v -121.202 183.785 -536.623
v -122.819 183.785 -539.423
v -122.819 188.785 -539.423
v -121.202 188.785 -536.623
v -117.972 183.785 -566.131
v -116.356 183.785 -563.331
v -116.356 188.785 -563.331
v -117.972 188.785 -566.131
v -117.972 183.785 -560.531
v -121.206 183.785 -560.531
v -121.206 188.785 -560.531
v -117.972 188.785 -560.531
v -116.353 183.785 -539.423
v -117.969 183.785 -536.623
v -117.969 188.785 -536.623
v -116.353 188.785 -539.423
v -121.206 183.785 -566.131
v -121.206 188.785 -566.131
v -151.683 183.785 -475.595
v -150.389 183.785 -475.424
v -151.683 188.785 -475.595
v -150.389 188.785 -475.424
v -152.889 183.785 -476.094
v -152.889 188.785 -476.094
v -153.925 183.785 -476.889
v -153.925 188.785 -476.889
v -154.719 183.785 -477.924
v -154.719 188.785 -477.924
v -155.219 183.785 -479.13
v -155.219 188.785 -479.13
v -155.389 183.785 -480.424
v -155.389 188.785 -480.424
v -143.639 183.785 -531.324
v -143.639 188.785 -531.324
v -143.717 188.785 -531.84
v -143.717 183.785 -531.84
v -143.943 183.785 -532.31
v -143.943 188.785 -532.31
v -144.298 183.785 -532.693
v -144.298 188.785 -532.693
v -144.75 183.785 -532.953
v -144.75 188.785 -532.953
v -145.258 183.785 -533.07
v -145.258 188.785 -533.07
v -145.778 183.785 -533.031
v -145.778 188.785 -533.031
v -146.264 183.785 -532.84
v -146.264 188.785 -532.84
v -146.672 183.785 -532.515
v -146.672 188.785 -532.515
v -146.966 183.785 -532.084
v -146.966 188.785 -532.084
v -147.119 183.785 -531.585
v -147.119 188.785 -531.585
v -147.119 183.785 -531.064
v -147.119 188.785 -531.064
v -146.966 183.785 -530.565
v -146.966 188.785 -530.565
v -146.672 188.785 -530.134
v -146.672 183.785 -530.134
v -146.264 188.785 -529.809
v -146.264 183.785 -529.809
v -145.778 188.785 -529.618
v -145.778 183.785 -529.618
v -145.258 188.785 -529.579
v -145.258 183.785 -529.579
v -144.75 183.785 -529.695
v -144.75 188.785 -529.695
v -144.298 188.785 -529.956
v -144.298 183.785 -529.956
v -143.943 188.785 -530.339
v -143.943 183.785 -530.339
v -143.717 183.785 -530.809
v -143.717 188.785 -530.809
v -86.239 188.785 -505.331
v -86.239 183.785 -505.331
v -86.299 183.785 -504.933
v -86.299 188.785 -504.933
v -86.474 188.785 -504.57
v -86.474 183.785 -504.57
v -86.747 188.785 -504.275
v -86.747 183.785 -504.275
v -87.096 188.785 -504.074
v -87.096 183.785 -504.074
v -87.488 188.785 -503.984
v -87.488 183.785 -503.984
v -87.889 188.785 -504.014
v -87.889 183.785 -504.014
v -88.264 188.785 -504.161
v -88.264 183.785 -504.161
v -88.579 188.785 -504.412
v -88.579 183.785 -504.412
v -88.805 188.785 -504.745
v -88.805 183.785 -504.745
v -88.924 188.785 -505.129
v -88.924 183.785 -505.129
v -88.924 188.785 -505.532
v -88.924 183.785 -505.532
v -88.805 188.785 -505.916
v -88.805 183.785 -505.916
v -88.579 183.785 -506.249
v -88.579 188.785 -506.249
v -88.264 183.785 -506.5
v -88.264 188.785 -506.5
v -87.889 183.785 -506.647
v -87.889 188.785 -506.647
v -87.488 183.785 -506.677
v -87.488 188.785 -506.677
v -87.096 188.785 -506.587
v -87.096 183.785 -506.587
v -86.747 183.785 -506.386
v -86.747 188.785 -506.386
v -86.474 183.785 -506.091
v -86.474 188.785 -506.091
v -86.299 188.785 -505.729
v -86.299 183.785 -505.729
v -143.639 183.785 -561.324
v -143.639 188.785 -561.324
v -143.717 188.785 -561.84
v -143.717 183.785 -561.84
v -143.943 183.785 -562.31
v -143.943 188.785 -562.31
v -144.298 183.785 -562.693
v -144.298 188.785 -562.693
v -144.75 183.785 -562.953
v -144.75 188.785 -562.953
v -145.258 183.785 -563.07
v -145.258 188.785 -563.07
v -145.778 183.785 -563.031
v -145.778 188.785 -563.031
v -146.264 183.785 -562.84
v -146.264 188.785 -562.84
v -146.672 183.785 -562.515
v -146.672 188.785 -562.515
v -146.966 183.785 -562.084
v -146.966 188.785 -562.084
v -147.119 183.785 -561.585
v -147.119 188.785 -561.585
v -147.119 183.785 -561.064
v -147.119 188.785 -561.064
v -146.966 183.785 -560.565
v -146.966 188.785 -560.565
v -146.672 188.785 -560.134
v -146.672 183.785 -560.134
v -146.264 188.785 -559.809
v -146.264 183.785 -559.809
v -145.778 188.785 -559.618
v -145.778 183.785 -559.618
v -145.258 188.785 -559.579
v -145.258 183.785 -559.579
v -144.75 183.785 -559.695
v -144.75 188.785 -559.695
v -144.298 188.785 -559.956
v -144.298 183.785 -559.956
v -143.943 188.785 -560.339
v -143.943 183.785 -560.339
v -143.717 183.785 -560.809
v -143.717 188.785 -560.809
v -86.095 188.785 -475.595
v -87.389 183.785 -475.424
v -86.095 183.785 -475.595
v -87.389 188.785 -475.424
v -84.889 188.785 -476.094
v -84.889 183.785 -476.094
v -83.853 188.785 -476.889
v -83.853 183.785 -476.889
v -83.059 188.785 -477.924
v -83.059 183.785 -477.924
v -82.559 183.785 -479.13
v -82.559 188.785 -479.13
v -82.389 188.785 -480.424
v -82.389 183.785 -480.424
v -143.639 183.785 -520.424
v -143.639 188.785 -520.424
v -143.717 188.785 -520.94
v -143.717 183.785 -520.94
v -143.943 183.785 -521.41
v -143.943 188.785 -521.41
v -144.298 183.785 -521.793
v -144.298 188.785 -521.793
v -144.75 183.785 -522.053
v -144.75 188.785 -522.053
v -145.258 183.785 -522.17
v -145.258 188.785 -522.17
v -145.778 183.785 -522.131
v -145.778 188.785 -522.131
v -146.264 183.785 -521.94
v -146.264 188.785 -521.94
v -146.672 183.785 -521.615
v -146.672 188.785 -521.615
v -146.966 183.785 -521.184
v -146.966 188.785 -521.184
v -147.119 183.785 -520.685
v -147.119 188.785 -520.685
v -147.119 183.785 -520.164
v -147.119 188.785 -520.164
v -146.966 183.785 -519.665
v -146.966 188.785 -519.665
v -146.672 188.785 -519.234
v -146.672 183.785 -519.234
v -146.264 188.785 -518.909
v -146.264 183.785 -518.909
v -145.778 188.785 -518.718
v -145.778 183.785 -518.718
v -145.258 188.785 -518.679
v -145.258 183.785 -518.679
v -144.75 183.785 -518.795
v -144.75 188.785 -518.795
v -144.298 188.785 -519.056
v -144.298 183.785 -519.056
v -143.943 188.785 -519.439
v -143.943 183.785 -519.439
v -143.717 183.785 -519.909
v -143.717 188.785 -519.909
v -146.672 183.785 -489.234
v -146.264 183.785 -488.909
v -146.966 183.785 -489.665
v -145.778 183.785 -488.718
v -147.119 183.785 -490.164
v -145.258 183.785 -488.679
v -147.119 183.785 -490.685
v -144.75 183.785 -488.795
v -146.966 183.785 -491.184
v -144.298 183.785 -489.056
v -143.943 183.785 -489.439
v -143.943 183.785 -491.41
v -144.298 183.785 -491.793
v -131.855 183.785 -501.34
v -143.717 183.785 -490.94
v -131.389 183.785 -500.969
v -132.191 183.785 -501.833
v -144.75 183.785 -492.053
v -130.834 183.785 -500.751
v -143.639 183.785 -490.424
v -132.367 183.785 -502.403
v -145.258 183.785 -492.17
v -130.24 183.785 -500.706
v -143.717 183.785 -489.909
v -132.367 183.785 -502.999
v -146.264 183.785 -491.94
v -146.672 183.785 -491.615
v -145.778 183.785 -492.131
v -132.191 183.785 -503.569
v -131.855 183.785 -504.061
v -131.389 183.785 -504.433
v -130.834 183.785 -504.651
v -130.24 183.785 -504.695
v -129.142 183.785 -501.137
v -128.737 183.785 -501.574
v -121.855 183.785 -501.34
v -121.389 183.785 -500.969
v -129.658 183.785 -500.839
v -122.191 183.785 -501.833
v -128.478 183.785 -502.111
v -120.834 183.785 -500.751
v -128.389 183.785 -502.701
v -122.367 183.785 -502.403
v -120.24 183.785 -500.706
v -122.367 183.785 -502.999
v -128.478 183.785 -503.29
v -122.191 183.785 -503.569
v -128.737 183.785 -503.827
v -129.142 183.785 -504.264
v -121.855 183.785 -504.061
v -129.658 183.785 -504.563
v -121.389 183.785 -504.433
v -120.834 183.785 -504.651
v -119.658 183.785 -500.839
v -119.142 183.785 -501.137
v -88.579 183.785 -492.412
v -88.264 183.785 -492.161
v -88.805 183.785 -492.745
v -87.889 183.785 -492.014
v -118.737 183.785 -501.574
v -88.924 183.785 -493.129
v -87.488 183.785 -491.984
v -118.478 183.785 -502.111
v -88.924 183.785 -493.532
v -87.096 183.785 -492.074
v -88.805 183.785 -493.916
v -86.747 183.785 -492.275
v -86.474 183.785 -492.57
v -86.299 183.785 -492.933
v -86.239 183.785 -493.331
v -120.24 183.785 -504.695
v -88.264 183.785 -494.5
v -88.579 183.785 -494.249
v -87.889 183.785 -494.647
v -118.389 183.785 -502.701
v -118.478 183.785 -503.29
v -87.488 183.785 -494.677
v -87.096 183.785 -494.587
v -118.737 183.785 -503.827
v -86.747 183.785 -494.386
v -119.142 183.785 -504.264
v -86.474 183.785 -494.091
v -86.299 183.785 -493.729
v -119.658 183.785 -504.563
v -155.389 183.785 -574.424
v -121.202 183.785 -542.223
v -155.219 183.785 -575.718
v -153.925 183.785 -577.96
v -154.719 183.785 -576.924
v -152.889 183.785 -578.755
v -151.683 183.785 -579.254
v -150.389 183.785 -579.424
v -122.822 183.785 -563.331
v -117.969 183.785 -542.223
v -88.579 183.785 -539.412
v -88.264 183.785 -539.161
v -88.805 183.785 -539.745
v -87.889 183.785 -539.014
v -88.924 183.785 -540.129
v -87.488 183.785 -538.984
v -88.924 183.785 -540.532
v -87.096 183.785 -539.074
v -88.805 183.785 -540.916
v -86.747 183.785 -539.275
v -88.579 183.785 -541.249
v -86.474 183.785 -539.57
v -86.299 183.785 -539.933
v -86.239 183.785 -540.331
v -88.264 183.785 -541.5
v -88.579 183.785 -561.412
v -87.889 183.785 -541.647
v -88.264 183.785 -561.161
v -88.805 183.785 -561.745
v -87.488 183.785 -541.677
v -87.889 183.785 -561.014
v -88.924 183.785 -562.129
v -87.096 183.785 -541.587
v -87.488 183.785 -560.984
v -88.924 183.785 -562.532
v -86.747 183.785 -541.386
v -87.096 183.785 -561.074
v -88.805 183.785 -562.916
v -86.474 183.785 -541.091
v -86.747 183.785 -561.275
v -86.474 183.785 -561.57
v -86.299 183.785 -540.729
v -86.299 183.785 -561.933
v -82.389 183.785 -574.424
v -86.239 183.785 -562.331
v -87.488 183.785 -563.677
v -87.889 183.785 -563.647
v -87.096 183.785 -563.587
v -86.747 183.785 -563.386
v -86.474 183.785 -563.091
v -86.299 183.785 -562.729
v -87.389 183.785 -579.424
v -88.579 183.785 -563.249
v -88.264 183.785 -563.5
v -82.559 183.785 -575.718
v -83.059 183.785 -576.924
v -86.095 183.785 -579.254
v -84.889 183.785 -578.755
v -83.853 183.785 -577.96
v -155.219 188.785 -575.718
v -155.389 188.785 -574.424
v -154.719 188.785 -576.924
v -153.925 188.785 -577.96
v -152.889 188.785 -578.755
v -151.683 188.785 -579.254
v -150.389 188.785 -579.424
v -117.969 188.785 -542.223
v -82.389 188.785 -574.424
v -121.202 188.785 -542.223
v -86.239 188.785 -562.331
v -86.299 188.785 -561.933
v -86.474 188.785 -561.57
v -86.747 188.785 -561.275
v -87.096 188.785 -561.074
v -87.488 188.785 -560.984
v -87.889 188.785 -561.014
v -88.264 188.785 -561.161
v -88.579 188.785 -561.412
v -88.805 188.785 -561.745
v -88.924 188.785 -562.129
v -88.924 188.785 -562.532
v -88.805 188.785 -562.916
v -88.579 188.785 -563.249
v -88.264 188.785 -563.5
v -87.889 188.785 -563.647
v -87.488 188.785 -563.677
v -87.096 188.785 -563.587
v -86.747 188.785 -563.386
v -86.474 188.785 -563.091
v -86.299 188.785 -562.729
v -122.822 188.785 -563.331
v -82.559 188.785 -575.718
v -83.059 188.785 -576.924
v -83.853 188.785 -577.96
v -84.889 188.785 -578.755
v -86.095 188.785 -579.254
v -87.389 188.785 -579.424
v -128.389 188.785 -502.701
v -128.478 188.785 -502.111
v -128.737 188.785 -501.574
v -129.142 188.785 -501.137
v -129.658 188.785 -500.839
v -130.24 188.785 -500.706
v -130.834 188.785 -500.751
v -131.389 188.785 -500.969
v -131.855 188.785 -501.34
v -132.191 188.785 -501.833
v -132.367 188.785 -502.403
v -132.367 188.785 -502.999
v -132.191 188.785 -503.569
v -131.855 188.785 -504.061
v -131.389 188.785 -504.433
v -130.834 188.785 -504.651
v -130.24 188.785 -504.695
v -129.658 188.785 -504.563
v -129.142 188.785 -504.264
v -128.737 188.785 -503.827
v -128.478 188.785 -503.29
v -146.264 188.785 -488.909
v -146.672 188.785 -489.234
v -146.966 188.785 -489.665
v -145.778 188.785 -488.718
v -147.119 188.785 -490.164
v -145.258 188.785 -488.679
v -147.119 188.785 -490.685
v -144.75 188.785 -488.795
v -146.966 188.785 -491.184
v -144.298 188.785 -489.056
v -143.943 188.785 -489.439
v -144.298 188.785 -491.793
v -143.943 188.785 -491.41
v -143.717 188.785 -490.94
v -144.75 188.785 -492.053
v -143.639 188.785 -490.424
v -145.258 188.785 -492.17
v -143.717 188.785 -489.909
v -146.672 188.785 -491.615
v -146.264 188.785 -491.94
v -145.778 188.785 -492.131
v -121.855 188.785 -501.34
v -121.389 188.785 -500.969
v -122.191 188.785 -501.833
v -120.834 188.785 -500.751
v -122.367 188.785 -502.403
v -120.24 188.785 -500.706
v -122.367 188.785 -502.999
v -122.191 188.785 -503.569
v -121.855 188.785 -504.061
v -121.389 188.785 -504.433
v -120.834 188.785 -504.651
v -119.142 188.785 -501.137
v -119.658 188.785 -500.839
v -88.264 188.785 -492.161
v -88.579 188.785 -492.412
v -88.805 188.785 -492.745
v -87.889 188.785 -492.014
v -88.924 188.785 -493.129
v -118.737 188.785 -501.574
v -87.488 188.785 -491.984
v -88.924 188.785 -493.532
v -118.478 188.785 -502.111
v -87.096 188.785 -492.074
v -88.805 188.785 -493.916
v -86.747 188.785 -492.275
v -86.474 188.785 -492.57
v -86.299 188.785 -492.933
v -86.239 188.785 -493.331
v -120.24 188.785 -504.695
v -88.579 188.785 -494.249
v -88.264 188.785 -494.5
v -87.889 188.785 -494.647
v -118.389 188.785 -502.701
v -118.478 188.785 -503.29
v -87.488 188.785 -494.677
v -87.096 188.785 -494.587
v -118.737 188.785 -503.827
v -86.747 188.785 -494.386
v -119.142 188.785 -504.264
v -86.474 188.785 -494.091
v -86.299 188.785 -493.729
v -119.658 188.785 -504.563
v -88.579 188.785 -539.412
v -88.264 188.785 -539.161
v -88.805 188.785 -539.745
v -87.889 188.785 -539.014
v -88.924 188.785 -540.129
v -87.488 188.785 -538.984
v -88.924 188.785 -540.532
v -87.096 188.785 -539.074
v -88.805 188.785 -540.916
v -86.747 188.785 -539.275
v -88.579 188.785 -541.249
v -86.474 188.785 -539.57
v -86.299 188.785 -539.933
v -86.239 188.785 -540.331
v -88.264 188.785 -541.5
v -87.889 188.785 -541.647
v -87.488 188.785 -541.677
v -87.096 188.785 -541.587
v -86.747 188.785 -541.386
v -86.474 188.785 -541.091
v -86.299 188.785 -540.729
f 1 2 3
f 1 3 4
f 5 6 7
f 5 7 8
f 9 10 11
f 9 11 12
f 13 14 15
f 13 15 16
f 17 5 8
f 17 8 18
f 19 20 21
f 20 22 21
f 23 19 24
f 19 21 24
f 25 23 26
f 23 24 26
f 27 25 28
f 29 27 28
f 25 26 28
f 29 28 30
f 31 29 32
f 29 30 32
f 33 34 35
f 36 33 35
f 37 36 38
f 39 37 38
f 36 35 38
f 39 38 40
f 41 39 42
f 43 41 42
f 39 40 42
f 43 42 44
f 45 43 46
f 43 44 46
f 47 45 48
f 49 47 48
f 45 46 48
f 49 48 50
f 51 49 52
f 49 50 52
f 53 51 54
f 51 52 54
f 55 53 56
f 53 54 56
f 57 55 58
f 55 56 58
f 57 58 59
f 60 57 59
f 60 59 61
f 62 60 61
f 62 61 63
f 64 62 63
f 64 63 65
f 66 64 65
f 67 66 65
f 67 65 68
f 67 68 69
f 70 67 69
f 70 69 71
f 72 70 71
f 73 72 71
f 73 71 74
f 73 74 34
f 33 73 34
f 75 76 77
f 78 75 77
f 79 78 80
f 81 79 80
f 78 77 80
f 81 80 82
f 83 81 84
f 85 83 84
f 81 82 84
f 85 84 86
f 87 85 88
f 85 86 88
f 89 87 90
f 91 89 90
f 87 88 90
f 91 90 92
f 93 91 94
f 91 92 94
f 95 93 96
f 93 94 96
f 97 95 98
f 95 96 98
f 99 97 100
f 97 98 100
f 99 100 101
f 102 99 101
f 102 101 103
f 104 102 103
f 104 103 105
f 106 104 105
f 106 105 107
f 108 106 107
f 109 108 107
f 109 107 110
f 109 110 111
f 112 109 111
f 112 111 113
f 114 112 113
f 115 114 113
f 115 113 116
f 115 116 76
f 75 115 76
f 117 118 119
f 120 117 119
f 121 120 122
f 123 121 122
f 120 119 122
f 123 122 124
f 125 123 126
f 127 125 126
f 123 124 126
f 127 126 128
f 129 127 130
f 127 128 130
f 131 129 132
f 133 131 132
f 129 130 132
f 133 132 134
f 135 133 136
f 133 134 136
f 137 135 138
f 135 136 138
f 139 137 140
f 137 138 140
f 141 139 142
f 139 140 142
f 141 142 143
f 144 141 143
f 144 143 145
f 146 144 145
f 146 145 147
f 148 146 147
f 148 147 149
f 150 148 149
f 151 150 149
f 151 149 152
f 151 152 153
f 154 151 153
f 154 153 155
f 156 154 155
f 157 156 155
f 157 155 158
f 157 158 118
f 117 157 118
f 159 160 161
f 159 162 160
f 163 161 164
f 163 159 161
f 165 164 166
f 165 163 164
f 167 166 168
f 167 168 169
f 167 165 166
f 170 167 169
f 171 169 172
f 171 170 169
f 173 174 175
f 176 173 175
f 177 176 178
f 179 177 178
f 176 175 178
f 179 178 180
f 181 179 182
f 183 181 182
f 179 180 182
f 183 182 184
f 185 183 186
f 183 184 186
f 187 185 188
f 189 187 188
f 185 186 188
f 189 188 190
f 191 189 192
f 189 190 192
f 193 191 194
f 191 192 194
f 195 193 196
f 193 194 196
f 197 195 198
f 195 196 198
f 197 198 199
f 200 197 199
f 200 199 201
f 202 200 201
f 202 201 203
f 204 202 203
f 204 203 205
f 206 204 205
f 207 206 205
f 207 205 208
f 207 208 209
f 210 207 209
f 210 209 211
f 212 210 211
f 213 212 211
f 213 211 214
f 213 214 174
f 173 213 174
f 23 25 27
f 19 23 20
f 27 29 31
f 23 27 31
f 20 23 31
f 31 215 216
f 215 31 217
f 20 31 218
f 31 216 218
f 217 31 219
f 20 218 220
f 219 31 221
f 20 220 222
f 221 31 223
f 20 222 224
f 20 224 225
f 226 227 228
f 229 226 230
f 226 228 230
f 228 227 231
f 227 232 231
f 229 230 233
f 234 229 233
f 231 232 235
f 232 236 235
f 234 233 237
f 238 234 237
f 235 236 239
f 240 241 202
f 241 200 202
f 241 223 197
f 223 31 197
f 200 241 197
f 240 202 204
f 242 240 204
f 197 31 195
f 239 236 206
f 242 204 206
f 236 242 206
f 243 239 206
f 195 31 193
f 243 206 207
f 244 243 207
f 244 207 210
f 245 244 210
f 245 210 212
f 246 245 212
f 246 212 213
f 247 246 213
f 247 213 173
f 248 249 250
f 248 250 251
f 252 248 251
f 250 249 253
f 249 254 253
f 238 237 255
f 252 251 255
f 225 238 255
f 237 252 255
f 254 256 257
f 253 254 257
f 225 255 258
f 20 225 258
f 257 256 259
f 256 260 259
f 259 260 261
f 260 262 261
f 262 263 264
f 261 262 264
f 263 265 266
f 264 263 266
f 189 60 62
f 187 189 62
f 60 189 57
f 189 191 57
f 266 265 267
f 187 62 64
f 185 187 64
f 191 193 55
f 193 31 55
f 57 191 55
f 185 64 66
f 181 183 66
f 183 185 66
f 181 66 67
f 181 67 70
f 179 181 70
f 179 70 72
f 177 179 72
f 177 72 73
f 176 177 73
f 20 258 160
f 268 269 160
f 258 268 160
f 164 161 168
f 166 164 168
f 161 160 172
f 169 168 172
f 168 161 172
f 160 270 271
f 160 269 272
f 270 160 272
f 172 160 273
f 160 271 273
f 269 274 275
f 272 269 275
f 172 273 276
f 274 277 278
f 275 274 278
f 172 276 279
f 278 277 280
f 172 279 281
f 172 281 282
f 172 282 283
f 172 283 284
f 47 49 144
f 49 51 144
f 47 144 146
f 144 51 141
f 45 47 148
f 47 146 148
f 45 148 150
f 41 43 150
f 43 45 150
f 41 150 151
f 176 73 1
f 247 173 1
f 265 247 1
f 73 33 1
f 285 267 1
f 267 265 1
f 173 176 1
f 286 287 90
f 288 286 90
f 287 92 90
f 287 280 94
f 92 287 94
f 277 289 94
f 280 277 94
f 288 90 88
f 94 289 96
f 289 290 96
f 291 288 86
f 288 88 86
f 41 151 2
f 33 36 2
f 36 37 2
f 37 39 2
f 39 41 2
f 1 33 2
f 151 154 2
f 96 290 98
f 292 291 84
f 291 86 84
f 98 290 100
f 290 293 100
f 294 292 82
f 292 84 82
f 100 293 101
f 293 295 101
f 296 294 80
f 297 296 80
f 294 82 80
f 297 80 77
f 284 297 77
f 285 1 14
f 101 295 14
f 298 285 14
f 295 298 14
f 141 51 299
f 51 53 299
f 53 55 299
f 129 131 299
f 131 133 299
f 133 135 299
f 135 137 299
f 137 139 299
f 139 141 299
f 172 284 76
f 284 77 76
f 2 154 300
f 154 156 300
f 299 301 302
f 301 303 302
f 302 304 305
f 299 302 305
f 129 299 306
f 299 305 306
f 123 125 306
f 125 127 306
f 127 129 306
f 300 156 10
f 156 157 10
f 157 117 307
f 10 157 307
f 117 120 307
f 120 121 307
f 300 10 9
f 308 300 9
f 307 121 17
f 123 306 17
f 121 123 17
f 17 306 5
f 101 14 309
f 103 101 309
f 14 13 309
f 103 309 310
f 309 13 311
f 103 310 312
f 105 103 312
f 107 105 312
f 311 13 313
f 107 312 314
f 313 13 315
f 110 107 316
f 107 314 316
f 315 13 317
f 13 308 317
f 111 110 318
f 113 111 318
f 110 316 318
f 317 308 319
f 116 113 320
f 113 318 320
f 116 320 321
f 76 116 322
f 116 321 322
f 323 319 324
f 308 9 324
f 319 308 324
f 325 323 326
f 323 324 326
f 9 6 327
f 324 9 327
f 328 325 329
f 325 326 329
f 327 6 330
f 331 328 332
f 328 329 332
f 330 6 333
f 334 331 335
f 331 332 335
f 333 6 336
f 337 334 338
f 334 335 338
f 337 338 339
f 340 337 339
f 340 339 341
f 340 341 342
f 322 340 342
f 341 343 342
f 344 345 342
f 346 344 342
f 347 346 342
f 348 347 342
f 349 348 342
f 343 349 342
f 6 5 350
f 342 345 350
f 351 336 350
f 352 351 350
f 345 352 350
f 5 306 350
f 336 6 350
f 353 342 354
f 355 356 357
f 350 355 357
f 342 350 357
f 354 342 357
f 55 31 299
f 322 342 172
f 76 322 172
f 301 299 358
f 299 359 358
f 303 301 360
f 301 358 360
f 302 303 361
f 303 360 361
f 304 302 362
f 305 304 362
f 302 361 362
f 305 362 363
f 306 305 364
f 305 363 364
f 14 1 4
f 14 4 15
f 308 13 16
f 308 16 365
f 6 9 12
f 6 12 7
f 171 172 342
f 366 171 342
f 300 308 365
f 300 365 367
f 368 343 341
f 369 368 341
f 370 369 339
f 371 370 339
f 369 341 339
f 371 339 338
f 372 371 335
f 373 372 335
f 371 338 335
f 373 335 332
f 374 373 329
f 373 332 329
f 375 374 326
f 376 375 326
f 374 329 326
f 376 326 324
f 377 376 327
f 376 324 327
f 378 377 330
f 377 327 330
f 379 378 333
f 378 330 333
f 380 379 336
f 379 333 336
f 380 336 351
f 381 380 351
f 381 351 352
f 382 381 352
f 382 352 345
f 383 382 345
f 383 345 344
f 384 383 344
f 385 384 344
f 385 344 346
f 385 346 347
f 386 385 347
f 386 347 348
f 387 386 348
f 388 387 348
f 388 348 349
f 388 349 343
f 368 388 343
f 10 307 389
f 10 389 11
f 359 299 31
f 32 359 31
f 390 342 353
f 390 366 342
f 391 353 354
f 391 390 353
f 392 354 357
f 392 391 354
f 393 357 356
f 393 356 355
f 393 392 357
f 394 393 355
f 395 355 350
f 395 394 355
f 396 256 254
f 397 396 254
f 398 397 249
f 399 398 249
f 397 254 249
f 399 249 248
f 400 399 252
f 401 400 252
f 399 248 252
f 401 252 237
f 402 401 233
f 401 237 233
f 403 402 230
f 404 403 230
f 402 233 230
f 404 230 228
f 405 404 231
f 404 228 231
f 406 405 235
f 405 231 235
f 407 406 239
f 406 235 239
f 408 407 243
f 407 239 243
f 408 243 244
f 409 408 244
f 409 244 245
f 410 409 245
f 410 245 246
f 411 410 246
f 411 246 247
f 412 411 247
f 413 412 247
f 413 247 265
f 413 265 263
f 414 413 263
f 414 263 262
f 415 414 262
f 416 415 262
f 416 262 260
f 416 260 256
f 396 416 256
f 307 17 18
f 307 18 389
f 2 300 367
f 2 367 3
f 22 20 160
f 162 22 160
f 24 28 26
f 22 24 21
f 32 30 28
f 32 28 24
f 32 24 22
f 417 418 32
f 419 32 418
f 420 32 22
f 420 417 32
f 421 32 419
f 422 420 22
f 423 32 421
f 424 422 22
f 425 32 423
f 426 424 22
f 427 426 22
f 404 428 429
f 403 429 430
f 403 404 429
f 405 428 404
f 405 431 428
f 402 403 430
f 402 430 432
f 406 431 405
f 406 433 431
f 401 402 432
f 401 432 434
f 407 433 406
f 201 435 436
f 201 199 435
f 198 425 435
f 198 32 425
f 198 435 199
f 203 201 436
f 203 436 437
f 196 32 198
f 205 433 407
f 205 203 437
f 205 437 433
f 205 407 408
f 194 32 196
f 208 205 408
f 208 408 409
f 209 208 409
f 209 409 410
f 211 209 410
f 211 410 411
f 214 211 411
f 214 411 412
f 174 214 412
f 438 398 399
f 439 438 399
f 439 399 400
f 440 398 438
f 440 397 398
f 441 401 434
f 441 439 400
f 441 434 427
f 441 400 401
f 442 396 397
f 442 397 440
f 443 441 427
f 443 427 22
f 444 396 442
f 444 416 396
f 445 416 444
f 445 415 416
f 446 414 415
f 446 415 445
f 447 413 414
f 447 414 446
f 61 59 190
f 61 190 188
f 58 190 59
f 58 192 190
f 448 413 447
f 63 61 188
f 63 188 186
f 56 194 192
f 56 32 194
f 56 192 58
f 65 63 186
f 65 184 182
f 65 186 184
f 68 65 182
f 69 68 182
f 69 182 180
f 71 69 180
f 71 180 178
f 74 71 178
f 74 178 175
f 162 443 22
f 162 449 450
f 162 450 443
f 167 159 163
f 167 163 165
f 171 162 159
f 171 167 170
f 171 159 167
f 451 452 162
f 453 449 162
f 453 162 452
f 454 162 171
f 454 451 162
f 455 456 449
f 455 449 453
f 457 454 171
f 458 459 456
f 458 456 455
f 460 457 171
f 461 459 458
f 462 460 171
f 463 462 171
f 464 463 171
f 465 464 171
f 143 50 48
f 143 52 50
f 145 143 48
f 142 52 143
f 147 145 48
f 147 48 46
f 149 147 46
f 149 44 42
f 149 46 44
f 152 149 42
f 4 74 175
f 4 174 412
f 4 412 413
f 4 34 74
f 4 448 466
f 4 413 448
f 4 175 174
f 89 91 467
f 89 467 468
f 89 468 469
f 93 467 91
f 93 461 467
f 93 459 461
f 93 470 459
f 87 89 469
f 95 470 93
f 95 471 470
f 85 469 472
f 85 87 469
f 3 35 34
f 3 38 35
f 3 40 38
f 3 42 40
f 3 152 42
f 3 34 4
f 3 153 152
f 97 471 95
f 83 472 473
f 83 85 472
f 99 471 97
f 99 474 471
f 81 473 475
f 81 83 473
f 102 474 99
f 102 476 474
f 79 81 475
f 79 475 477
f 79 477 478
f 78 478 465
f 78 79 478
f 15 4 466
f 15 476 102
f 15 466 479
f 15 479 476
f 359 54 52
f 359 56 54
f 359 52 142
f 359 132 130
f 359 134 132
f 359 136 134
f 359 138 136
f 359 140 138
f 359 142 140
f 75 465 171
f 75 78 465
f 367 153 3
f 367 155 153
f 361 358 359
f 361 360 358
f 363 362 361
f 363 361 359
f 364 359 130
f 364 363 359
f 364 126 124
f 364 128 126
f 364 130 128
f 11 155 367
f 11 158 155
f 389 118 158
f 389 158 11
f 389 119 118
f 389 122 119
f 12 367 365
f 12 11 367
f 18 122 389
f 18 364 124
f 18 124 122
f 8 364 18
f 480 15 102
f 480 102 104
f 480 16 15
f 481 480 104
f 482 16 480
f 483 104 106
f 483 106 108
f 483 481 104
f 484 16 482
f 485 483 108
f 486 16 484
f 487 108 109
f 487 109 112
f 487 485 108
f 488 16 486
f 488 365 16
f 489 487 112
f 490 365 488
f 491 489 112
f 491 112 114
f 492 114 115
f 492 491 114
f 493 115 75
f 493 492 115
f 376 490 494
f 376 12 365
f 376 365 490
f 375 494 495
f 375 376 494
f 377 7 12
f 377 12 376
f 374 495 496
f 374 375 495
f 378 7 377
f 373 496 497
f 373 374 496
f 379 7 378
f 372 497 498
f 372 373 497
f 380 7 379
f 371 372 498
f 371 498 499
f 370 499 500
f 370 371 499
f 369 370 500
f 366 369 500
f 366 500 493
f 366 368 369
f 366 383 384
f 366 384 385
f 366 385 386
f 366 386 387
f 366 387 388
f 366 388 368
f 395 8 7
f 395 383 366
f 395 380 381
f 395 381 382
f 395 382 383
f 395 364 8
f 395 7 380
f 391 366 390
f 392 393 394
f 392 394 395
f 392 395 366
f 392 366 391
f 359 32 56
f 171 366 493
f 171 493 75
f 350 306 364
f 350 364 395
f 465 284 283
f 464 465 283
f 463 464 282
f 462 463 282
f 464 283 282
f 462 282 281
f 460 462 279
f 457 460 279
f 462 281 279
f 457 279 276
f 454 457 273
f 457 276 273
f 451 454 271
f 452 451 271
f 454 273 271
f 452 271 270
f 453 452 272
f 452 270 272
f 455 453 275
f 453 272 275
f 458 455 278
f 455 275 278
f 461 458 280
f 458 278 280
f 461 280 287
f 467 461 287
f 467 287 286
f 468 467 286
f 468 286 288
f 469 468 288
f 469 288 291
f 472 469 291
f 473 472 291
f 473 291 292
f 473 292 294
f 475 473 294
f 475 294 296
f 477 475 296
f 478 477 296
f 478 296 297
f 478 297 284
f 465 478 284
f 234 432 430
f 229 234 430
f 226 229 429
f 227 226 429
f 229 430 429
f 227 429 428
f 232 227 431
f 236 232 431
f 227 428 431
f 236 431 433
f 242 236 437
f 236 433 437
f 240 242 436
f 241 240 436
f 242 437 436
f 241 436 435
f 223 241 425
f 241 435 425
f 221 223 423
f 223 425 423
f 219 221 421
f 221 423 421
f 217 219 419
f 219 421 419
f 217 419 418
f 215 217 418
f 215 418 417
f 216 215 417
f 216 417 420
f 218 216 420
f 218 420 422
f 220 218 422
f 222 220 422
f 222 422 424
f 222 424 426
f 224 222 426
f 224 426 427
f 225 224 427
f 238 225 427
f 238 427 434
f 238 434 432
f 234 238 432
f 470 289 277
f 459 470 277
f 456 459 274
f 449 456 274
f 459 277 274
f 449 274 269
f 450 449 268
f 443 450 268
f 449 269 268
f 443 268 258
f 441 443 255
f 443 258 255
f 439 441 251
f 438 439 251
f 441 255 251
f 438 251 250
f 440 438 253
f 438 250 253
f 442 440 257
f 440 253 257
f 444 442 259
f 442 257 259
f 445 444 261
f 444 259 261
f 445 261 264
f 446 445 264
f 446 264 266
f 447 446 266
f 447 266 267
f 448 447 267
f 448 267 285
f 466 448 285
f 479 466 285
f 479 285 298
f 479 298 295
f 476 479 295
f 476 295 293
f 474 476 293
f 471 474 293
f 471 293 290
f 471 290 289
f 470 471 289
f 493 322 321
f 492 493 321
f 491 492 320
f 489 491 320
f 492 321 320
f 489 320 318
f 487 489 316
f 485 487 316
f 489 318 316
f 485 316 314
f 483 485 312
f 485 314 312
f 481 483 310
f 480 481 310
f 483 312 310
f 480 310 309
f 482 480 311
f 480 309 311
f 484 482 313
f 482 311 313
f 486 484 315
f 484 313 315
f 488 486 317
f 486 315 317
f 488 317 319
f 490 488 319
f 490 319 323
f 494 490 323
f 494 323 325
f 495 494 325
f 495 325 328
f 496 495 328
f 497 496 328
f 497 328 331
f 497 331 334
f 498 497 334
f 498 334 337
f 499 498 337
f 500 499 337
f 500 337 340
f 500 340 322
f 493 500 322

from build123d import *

# Parameters (mm, degrees)
SKETCH1_W           = 75
SKETCH1_H           = 104
BOSS_EXTRUDE1_DEPTH = 5
SKETCH2_R           = 1.75
CUT_EXTRUDE1_DEPTH  = 6
SKETCH3_R           = 1.35
SKETCH3_R_2         = 2
CUT_EXTRUDE2_DEPTH  = 6
SKETCH4_W           = 2
SKETCH4_H           = 104
CUT_EXTRUDE3_DEPTH  = 6
FILLET1_R           = 5


with BuildPart() as part:
    # Sketch1 → Boss-Extrude1 (new body)
    with BuildSketch(Plane(origin=(-157.38903018, 183.784554556, -475.424398782), x_dir=(1, 0, 0), z_dir=(0, 1, 0))):
        with Locations((37.5, 52)):
            Rectangle(SKETCH1_W, SKETCH1_H)
    extrude(amount=BOSS_EXTRUDE1_DEPTH)

    # Sketch2 → Cut-Extrude1 (cut, through all)
    with BuildSketch(Plane(origin=(0, 188.784554556, 0), x_dir=(1, 0, 0), z_dir=(0, 1, 0))):
        with Locations((-145.38903018, 490.424398782)):
            Circle(SKETCH2_R)
        with Locations((-145.38903018, 520.424398782)):
            Circle(SKETCH2_R)
        with Locations((-145.38903018, 531.324398782)):
            Circle(SKETCH2_R)
        with Locations((-145.38903018, 561.324398782)):
            Circle(SKETCH2_R)
    extrude(amount=-CUT_EXTRUDE1_DEPTH, mode=Mode.SUBTRACT)

    # Sketch3 → Cut-Extrude2 (cut, through all)
    with BuildSketch(Plane.XZ.offset(-183.784554556)):
        with Locations((-87.58903018, -493.330584132)):
            Circle(SKETCH3_R)
        with Locations((-87.58903018, -505.330584132)):
            Circle(SKETCH3_R)
        with Locations((-87.58903018, -540.330584132)):
            Circle(SKETCH3_R)
        with Locations((-87.589030179, -562.330584132)):
            Circle(SKETCH3_R)
        with Locations((-130.38903018, -502.700786837)):
            Circle(SKETCH3_R_2)
        with Locations((-120.38903018, -502.700786837)):
            Circle(SKETCH3_R_2)
        Polygon((-116.355868672, -563.330584132), (-117.972449426, -566.130584132), (-121.205610933, -566.130584132), (-122.822191687, -563.330584132), (-121.205610933, -560.530584132), (-117.972449426, -560.530584132), align=None)
        Polygon((-116.352707165, -539.423221972), (-117.969287918, -542.223221972), (-121.202449426, -542.223221972), (-122.81903018, -539.423221972), (-121.202449426, -536.623221972), (-117.969287918, -536.623221972), align=None)
    extrude(amount=-CUT_EXTRUDE2_DEPTH, mode=Mode.SUBTRACT)

    # Sketch4 → Cut-Extrude3 (cut, through all)
    with BuildSketch(Plane.XZ.offset(-183.784554556)):
        with Locations((-156.38903018, -527.424398782)):
            Rectangle(SKETCH4_W, SKETCH4_H)
    extrude(amount=-CUT_EXTRUDE3_DEPTH, mode=Mode.SUBTRACT)

    # Fillet1
    fillet1_edges = [part.edges().sort_by_distance(p)[0] for p in [
        (-155.38903018, 186.284554556, -475.424398782),
        (-155.38903018, 186.284554556, -579.424398782),
        (-82.38903018, 186.284554556, -579.424398782),
        (-82.38903018, 186.284554556, -475.424398782),
    ]]
    fillet(fillet1_edges, radius=FILLET1_R)


solid = part.part
